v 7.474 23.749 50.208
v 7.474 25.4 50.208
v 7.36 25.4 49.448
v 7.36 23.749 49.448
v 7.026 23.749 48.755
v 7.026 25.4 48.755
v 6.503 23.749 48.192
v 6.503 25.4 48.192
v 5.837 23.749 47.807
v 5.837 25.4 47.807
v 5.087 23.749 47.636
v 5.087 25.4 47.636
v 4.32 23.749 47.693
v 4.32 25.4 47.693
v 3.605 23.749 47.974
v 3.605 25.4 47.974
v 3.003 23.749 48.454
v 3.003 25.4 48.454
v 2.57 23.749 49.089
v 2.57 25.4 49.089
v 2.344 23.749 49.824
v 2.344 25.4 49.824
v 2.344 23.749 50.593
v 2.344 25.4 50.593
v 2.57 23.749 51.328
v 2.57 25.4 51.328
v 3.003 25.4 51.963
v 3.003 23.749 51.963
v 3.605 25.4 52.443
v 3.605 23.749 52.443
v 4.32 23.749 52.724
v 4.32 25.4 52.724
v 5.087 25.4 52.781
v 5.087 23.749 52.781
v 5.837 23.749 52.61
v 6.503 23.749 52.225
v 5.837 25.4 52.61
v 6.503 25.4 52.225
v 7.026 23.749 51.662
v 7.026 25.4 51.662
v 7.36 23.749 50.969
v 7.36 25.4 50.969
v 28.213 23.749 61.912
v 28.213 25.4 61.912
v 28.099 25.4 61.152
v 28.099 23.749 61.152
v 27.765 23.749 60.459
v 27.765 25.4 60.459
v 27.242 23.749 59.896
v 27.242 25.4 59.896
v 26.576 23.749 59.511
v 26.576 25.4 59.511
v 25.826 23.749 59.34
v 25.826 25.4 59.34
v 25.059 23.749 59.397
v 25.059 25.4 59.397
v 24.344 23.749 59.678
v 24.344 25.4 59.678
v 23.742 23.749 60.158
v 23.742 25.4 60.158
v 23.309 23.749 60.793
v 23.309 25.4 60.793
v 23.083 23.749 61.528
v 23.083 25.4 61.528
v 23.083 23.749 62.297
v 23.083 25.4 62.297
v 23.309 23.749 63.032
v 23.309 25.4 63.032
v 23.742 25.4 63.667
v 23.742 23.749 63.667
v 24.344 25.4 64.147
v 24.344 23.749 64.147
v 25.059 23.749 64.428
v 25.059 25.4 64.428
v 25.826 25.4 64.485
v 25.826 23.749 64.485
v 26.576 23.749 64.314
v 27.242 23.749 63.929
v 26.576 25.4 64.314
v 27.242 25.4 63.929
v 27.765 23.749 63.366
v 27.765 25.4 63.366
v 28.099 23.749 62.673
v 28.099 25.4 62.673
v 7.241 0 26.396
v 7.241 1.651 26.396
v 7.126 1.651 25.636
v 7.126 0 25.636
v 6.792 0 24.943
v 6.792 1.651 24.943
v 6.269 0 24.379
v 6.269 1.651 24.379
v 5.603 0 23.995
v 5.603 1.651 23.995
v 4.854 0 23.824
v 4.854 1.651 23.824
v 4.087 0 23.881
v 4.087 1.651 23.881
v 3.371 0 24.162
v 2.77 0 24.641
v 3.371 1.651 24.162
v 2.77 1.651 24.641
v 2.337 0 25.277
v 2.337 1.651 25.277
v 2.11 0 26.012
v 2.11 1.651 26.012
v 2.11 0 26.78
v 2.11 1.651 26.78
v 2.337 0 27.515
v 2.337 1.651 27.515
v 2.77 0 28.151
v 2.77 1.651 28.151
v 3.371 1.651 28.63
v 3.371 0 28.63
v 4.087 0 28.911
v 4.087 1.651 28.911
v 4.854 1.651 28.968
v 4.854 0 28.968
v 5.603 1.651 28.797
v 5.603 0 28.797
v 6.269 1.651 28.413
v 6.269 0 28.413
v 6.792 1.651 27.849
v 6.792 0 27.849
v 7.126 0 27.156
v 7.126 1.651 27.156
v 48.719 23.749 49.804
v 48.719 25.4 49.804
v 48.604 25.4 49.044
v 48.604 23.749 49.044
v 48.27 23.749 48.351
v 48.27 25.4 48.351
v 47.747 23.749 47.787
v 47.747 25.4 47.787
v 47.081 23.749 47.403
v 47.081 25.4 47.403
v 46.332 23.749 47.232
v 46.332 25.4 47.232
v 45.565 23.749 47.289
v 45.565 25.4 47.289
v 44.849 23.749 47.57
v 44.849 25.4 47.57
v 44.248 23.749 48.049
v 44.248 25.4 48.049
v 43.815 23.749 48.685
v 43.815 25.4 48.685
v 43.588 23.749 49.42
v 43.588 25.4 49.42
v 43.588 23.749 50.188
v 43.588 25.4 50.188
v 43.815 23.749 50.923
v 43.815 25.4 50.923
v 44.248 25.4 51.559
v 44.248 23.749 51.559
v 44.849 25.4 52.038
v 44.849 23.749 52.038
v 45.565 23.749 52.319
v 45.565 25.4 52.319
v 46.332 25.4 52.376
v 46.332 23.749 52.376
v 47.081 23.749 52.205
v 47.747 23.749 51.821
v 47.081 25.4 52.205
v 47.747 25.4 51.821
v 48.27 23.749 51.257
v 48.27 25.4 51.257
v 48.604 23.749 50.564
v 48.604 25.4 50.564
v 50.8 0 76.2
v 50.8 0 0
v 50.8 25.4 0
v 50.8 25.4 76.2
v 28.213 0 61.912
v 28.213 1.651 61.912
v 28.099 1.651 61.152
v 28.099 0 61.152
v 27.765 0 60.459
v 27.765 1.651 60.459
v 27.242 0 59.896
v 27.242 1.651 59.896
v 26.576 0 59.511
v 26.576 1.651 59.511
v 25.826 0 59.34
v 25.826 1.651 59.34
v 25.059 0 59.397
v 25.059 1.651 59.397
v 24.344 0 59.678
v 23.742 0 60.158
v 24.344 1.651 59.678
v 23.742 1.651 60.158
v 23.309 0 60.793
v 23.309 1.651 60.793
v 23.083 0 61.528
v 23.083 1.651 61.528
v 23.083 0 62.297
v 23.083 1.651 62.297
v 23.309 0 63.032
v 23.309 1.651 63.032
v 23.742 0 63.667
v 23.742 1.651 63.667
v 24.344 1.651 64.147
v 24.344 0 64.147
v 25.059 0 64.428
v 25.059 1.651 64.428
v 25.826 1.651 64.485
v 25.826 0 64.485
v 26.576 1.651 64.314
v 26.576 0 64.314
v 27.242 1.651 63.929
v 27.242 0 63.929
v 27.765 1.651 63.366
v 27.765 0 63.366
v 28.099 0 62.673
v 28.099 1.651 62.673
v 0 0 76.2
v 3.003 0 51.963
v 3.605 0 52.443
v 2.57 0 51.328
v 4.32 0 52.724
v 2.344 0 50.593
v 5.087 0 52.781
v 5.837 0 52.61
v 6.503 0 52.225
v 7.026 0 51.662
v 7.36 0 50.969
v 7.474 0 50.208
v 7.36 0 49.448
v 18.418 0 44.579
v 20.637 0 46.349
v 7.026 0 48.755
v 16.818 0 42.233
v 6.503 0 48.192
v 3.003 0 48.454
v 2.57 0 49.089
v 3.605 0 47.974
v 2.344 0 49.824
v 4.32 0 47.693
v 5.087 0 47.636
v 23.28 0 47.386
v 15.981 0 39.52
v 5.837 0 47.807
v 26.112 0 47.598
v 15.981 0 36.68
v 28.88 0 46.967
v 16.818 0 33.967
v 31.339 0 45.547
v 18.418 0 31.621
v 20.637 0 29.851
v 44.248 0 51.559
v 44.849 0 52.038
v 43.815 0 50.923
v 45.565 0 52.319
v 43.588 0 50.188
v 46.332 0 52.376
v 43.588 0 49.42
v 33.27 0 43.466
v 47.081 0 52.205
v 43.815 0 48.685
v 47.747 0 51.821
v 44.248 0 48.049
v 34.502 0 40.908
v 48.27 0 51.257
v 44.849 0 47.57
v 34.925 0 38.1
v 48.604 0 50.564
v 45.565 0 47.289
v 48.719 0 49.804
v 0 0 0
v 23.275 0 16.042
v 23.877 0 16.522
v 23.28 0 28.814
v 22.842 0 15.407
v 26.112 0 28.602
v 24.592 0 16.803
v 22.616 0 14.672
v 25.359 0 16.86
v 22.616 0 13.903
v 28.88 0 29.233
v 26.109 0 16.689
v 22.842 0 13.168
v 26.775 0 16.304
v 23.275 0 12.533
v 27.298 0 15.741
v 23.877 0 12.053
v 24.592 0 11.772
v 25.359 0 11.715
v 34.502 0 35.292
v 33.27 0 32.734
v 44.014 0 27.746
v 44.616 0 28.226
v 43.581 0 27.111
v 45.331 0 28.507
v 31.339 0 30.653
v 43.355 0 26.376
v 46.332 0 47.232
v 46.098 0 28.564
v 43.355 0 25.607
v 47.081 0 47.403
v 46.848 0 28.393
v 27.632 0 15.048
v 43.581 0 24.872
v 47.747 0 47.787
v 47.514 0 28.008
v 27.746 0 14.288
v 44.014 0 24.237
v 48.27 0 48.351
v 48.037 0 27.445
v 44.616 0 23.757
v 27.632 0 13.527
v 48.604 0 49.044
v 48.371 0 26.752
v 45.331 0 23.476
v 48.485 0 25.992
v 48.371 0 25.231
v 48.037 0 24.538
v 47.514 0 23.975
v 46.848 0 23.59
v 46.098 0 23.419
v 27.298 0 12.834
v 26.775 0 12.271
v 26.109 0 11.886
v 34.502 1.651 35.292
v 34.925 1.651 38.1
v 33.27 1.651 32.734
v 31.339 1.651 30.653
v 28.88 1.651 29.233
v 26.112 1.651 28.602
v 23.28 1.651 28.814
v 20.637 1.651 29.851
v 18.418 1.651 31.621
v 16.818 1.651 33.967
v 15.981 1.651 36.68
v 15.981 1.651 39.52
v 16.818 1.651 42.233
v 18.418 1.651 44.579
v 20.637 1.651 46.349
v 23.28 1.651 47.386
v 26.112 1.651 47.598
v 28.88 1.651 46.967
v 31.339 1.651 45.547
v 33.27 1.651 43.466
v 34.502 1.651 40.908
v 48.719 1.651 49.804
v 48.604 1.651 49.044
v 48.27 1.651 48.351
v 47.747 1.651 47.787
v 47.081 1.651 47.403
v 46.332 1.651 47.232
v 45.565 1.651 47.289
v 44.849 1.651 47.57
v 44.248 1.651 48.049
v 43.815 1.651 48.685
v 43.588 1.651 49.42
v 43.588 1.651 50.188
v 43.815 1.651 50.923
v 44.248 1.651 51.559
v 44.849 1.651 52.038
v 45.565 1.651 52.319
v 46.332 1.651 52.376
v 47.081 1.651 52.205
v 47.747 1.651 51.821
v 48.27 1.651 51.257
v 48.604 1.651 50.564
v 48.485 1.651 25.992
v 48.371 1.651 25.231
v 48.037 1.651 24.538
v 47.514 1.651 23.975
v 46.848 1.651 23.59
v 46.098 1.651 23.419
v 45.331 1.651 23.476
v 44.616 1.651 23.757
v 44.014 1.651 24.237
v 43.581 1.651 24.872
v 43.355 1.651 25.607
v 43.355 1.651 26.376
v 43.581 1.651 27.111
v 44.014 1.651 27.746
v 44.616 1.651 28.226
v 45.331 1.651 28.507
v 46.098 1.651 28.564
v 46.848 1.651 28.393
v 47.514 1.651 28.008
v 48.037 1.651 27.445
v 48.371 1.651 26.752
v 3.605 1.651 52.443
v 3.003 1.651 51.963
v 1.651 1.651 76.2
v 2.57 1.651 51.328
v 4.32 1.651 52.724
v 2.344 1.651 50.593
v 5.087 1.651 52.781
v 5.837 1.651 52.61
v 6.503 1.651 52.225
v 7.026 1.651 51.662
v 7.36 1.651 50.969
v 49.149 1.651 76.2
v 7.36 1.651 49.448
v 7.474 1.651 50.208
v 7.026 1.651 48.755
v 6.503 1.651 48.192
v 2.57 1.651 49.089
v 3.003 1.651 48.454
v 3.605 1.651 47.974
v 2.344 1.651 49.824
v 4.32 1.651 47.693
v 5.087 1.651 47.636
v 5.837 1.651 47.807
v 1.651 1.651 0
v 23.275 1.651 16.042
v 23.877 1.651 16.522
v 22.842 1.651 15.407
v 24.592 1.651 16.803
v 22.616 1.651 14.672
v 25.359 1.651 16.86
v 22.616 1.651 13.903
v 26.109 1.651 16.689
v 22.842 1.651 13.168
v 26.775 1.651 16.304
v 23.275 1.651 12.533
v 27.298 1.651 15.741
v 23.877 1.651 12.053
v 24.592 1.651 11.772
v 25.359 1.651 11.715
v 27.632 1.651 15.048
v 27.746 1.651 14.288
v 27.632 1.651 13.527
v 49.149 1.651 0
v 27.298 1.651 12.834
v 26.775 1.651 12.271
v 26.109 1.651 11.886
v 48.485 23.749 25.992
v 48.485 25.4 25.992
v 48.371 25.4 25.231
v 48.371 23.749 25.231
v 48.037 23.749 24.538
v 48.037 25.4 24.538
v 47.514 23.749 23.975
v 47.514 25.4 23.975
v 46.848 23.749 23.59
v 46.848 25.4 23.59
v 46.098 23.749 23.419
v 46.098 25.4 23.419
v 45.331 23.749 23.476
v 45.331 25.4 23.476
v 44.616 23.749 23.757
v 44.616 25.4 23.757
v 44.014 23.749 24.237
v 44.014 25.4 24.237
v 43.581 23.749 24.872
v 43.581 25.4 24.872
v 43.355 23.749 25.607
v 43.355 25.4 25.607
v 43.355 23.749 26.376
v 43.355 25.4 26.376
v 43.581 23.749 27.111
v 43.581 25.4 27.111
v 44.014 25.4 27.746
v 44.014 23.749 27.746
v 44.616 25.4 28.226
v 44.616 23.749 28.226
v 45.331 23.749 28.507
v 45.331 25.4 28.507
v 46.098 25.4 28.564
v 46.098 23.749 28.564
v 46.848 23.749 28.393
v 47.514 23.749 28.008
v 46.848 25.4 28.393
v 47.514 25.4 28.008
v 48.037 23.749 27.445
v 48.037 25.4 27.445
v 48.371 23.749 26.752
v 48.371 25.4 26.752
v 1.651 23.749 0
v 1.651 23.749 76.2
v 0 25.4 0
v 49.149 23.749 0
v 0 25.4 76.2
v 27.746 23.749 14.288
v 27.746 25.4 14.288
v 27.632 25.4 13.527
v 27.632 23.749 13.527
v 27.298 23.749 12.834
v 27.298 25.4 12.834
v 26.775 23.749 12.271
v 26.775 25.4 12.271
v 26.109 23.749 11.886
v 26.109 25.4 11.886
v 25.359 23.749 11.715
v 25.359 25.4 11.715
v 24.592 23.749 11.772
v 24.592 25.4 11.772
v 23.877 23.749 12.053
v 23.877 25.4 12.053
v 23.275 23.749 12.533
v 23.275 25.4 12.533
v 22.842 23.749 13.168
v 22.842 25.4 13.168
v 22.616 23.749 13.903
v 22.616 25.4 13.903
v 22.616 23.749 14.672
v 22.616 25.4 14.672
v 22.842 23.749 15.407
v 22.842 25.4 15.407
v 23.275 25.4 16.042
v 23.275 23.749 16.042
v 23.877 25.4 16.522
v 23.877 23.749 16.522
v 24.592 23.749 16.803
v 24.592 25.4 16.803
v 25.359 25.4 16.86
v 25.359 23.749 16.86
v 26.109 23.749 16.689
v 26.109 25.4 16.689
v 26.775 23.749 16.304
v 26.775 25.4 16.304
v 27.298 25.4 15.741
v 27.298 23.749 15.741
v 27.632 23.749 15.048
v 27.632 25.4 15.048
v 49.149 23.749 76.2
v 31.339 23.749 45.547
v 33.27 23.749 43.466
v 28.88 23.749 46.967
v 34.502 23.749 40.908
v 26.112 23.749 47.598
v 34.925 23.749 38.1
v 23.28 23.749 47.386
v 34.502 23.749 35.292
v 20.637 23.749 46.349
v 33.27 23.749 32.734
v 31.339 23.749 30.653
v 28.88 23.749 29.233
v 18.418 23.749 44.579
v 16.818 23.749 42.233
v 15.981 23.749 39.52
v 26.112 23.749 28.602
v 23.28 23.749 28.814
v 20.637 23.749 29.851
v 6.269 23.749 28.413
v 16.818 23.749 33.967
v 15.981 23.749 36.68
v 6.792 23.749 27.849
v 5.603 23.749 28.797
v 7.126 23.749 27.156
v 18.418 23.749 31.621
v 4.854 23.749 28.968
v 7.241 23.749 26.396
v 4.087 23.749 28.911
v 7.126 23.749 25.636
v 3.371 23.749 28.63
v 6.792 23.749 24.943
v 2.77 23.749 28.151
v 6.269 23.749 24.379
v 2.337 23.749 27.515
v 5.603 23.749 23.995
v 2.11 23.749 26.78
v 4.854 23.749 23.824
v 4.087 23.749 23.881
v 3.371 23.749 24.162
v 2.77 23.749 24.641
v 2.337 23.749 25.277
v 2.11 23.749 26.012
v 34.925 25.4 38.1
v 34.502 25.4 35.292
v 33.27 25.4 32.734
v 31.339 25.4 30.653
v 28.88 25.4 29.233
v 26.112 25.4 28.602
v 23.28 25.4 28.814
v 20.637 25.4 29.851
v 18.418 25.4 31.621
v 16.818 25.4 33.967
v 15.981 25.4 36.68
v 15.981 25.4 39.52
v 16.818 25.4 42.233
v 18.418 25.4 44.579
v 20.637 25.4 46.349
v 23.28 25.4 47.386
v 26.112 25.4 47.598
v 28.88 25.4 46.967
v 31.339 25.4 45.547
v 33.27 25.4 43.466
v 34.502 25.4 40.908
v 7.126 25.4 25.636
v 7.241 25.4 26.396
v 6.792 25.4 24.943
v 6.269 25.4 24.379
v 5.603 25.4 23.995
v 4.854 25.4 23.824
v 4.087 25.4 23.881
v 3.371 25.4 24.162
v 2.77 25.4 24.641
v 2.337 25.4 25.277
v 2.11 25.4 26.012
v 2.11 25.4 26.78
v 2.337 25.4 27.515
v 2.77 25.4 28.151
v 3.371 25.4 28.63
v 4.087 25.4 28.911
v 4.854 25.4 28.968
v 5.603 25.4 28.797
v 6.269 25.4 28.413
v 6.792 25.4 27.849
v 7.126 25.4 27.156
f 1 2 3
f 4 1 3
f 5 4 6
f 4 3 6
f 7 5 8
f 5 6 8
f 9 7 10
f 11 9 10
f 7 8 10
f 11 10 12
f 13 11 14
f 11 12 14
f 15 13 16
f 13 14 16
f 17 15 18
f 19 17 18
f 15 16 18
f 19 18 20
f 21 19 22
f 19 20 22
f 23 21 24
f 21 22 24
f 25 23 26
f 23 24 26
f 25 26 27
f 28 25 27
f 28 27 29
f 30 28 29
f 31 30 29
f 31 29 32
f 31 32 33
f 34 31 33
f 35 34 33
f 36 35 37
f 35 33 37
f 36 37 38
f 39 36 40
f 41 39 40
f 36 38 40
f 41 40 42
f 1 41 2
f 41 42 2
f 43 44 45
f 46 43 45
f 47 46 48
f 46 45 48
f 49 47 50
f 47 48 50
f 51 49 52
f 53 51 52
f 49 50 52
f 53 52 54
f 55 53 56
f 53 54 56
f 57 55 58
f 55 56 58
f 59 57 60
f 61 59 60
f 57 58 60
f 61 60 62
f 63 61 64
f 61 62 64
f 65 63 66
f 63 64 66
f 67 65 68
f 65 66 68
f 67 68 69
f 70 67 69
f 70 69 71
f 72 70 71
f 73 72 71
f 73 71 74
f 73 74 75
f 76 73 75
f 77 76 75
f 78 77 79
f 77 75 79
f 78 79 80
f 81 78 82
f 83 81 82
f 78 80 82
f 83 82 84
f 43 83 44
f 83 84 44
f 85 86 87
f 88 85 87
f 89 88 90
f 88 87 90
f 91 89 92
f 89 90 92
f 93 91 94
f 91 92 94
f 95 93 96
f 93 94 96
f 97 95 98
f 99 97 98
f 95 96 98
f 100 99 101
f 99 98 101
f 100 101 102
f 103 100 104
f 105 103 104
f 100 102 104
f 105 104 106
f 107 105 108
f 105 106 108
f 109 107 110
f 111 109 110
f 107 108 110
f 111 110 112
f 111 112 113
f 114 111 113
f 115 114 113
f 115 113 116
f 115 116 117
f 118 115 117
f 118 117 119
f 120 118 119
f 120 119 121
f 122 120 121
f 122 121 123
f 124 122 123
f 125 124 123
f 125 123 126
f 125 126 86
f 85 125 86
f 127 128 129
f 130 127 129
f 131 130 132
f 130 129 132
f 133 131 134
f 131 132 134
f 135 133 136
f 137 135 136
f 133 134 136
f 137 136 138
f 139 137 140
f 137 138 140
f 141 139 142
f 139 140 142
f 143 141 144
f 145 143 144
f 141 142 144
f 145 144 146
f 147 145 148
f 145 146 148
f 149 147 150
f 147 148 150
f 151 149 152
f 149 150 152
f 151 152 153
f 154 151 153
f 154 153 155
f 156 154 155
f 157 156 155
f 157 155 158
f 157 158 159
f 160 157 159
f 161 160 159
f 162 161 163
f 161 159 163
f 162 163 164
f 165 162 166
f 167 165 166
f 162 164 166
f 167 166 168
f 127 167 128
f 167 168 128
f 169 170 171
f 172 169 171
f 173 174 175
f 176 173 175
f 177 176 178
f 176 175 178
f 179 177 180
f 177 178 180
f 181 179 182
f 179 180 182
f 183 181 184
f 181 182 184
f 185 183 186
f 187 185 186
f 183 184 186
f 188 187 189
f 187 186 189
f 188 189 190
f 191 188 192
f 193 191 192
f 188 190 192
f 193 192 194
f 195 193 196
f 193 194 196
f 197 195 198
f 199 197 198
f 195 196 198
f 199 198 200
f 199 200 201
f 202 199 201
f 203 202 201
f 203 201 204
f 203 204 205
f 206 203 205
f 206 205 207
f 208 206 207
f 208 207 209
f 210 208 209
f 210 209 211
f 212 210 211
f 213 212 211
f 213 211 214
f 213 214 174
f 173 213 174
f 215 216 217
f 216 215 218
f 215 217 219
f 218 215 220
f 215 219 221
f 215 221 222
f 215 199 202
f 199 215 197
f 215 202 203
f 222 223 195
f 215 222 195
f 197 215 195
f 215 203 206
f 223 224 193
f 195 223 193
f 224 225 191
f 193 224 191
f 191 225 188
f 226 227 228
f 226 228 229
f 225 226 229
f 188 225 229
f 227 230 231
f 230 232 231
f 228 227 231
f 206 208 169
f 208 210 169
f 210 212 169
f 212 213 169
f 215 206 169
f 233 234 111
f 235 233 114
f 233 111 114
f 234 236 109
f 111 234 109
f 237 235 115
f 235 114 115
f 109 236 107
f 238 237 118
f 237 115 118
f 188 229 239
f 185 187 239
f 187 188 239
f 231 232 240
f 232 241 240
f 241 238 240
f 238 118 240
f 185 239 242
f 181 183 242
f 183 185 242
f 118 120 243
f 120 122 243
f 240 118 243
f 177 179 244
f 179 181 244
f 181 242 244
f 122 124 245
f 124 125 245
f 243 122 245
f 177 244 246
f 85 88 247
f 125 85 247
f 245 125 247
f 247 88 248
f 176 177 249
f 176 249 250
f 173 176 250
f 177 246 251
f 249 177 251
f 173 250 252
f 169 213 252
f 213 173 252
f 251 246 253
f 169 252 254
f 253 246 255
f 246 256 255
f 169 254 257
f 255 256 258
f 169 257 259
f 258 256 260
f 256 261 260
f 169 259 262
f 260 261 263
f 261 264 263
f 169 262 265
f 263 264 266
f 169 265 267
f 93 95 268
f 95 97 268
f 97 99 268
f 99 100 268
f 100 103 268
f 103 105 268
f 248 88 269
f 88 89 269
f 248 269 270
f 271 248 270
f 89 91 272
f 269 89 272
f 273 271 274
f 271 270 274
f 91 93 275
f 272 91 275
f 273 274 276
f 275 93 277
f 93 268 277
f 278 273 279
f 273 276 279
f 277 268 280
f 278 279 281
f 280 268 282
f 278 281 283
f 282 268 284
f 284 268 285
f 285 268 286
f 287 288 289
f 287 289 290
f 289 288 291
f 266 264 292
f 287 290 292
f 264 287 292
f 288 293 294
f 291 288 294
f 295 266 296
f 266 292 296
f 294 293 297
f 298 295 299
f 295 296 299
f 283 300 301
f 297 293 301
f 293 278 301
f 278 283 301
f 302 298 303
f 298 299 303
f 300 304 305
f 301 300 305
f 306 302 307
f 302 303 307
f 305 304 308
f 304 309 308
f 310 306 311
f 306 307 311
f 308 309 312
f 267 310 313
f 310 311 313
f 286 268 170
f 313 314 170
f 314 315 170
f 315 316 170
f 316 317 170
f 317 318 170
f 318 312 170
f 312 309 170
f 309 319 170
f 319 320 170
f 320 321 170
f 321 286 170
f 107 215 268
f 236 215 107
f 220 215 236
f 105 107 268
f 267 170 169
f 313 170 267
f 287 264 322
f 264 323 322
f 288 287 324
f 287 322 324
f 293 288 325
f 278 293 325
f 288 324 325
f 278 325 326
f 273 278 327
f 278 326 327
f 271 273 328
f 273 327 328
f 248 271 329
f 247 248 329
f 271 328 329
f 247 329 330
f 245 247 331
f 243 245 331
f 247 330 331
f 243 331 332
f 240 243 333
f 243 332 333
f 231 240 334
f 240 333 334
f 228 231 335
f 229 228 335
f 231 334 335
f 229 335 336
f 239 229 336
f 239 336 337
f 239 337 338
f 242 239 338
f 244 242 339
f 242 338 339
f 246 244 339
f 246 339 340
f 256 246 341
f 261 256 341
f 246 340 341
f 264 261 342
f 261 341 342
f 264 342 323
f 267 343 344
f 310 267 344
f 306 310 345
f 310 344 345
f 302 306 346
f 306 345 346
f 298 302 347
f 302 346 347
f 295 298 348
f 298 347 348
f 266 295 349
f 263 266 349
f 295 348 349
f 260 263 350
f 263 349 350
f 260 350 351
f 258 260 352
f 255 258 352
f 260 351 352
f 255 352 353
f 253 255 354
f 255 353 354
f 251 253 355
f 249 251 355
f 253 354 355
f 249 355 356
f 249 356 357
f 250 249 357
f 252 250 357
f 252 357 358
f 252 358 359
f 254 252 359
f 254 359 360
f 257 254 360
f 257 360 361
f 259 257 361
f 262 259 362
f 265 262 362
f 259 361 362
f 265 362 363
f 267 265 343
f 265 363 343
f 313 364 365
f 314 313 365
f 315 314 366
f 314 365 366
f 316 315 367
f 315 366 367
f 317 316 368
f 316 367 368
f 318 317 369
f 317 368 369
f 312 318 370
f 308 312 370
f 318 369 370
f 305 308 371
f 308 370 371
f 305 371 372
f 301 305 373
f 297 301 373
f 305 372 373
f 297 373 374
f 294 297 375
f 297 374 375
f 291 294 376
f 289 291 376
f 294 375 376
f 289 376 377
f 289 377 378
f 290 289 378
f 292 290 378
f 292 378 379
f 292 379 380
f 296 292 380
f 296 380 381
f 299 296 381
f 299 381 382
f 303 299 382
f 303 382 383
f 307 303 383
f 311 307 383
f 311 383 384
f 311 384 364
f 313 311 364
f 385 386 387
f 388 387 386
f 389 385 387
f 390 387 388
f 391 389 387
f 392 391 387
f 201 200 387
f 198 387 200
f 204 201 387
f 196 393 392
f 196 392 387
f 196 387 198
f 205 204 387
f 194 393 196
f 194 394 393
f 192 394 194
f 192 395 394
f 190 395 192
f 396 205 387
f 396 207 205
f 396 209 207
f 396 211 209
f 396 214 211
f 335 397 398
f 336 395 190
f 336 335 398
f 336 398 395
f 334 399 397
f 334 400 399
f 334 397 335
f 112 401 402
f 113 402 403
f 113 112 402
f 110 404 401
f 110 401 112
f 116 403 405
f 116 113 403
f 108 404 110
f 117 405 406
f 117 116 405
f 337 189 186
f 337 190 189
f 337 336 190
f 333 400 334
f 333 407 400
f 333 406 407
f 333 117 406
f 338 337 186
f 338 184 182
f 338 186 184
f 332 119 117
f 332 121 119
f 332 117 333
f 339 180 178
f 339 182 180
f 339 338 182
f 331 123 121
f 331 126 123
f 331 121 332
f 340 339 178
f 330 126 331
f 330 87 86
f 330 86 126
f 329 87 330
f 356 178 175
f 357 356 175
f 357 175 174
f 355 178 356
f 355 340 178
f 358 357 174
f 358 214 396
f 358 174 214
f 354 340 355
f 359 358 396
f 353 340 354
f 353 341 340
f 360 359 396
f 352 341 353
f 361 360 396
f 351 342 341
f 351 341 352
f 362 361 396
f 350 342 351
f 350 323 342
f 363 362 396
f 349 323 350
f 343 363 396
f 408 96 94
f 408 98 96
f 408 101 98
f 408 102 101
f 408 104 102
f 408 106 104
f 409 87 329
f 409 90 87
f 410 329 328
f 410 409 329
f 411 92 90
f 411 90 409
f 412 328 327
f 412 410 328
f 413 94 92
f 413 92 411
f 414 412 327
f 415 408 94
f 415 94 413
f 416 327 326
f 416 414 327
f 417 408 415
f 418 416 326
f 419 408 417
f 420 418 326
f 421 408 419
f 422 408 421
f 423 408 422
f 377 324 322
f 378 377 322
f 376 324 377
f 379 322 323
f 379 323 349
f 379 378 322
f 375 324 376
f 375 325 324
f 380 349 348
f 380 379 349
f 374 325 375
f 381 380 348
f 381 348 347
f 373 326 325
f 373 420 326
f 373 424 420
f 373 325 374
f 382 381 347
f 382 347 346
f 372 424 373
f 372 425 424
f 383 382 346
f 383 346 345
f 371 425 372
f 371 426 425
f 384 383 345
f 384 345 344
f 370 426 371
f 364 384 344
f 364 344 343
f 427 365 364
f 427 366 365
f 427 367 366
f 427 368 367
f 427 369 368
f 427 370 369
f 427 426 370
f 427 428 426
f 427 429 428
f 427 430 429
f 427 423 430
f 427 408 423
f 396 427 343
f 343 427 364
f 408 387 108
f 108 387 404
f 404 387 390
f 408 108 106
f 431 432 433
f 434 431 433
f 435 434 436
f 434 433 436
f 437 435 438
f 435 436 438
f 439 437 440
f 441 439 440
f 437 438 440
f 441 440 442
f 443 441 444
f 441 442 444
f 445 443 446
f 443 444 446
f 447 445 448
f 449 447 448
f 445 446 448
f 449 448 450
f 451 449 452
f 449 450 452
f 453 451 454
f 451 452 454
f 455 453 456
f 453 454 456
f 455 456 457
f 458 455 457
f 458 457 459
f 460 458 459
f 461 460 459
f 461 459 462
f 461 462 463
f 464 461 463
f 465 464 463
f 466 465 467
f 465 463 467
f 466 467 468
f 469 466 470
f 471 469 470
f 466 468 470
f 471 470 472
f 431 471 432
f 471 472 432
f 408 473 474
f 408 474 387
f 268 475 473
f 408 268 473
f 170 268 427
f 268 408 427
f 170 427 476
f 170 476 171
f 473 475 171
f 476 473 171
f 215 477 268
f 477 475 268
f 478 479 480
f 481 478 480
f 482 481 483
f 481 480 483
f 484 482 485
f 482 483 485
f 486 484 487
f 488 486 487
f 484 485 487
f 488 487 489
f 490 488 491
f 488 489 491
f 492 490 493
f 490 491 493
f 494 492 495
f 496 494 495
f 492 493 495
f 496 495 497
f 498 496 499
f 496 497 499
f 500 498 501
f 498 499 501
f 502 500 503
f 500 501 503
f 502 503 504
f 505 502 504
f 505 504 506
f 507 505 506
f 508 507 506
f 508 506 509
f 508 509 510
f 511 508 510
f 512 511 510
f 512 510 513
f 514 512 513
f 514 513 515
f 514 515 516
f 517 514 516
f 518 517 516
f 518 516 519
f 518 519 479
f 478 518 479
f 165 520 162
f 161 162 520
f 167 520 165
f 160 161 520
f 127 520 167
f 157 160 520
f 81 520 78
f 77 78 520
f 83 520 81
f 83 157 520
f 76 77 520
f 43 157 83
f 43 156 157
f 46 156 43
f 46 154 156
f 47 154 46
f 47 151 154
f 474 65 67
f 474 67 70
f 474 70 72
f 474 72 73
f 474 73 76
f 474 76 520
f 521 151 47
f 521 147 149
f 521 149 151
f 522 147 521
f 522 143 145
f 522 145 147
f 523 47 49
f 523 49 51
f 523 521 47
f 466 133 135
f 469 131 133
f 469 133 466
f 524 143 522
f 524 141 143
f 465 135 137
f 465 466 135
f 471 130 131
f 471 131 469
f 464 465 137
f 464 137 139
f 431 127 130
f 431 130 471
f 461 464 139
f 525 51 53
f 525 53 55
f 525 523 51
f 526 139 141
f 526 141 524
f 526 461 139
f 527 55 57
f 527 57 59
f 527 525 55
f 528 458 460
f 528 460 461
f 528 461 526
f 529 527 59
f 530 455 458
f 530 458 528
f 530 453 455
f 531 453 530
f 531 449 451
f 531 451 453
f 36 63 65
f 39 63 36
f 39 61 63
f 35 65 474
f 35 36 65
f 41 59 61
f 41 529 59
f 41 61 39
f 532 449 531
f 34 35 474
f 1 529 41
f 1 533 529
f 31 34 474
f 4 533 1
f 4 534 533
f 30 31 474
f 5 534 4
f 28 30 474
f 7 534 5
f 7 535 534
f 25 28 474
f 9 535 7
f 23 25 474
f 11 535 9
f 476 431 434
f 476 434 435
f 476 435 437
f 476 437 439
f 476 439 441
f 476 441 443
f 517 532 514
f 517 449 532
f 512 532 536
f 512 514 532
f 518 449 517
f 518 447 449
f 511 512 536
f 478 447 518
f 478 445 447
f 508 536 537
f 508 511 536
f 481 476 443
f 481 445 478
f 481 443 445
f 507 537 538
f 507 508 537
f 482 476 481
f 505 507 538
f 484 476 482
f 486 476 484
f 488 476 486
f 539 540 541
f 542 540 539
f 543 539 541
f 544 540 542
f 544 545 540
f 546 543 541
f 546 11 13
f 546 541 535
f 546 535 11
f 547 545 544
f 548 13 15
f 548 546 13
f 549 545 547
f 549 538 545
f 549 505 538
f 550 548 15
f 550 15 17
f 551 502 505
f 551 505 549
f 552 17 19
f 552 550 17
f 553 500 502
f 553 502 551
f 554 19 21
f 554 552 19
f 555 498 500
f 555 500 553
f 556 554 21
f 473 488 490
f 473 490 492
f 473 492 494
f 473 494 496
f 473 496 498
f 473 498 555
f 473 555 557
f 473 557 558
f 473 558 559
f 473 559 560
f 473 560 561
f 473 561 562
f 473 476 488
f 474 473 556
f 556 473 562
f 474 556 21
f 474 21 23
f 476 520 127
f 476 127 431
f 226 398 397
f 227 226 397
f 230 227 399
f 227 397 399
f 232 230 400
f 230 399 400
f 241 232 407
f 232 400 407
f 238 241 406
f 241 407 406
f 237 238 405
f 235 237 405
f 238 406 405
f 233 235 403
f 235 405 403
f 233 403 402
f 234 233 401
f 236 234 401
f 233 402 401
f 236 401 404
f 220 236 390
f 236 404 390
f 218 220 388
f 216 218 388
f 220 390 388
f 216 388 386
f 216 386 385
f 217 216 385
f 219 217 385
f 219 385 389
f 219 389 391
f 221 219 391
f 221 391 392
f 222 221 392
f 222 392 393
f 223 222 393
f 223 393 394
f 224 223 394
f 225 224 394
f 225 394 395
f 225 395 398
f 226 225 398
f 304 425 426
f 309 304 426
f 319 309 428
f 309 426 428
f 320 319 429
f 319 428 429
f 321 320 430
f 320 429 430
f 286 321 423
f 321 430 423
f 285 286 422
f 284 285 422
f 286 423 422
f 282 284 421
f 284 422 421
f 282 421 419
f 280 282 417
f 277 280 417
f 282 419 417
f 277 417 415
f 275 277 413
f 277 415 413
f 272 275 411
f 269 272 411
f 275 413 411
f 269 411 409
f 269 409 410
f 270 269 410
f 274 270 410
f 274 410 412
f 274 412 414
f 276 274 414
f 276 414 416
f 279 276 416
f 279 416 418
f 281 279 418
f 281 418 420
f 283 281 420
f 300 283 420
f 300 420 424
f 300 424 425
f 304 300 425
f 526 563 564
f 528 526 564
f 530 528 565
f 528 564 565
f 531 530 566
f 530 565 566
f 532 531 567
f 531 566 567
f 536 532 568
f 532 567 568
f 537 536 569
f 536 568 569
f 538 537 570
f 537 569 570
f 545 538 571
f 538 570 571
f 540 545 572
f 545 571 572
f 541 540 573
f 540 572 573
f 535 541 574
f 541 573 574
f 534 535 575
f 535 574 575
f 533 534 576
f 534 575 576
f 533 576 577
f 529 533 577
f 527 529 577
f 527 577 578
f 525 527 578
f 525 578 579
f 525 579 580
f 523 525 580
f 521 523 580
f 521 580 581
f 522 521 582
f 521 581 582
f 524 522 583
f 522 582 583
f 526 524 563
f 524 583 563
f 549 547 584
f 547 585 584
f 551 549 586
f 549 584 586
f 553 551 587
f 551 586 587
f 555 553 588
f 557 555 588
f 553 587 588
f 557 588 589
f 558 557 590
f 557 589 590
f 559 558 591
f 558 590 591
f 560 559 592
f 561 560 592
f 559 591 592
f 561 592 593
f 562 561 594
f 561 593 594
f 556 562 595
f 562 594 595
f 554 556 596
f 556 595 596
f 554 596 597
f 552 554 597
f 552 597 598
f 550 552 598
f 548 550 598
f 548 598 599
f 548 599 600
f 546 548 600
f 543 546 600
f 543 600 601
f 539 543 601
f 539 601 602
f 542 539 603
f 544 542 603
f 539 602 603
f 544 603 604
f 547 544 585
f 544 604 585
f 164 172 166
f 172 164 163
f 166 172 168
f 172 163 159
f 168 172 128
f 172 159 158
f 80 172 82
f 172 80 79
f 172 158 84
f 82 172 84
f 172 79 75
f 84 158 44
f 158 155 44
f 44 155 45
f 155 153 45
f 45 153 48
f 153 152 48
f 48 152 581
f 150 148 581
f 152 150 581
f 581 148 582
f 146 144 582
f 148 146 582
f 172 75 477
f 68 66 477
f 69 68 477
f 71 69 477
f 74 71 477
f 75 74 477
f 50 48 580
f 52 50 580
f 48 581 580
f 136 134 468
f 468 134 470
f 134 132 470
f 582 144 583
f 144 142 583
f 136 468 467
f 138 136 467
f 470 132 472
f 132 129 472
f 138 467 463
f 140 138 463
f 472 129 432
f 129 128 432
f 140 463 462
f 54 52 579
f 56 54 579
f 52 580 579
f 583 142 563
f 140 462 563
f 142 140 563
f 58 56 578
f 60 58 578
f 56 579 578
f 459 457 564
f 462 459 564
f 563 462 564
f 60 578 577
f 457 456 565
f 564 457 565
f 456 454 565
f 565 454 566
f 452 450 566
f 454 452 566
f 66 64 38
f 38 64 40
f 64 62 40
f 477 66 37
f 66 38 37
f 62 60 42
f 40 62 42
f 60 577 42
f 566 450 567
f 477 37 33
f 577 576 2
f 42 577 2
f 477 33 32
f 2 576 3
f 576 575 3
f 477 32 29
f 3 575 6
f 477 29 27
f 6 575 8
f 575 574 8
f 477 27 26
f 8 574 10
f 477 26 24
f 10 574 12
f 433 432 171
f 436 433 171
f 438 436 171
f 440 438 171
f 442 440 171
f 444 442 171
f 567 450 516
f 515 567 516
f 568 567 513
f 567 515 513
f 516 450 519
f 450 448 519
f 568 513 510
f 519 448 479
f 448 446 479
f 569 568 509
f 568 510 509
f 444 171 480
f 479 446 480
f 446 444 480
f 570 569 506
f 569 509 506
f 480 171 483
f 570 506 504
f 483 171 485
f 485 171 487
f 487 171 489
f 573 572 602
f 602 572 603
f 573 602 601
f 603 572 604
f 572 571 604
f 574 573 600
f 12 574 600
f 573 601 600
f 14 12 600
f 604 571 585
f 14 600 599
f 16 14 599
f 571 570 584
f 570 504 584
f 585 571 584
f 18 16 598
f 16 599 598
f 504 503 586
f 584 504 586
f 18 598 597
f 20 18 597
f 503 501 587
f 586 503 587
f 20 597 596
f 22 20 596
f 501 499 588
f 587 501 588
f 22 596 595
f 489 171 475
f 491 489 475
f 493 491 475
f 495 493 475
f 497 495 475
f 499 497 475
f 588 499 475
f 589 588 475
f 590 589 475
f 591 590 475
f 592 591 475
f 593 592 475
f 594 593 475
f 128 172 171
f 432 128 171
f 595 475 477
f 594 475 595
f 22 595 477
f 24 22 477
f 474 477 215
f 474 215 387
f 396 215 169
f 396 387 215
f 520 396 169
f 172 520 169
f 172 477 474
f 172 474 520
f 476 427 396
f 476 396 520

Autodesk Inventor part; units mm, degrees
ref_plane "YZ Plane" through (0, 0, 0) normal (1, 0, 0) x (0, 1, 0)
ref_plane "XZ Plane" through (0, 0, 0) normal (0, 1, 0) x (-1, 0, 0)
ref_plane "XY Plane" through (0, 0, 0) normal (0, 0, 1) x (1, 0, 0)
sketch "Sketch1" plane through (0, 0, 0) normal (0, 0, 1) x (1, 0, 0)
  line L0 (0, 0) -> (50.8, 0)
  line L1 (50.8, 0) -> (50.8, 25.4)
  line L2 (50.8, 25.4) -> (0, 25.4)
  line L3 (0, 25.4) -> (0, 0)
  line L4 (49.149, 23.749) -> (1.651, 23.749)
  line L5 (1.651, 23.749) -> (1.651, 1.651)
  line L6 (1.651, 1.651) -> (49.149, 1.651)
  line L7 (49.149, 1.651) -> (49.149, 23.749)
  line L8 (49.149, 23.749) -> (1.651, 1.651) construction
  line L9 (1.651, 23.749) -> (49.149, 1.651) construction
  point P0 (25.4, 12.7)
  dimension "d0" = 1.651
  dimension "d1" = 25.4
  dimension "d2" = 50.8
  dimension "d3" = 1.651
  dimension "d4" = 1.651
  dimension "d5" = 1.651
extrude "Extrusion1" add sketch "Sketch1" along normal blind 76.2
sketch "Sketch2" plane through (0, 25.4, 0) normal (0, 1, 0) x (1, 0, 0)
  circle A0 centre (25.4, -38.1) radius 9.525
  line L0 (50.8, 0) -> (50.8, -76.2) projected
  line L1 (50.8, -76.2) -> (0, -76.2) projected
  point P0 (0, 0)
  dimension "d8" = 19.05
  dimension "d9" = 25.4
  dimension "d10" = 38.1
extrude "Extrusion2" cut sketch "Sketch2" against normal blind 76.2
sketch "Sketch4" plane through (0, 25.4, 0) normal (0, 1, 0) x (1, 0, 0)
  circle A0 centre (25.1665, -14.2875) radius 2.5797
  circle A1 centre (25.4, -38.1) radius 9.525 projected
  circle A2 centre (25.4, -38.1) radius 23.8136 construction
  circle A3 centre (4.661, -26.396) radius 2.5797
  circle A4 centre (4.8945, -50.2085) radius 2.5797
  circle A5 centre (25.6335, -61.9125) radius 2.5797
  circle A6 centre (46.139, -49.804) radius 2.5797
  circle A7 centre (45.9055, -25.9915) radius 2.5797
  point P0 (0, 0)
  dimension "d31" = 23.8125
  dimension "d32" = 5.1594
  dimension "d35" = 360
extrude "Extrusion4" cut sketch "Sketch4" against normal blind 76.2 contours A0 | A3 | A4 | A5 | A6 | A7
equation "\"d3\" = d0"
equation "\"d4\" = d0"
equation "\"d5\" = d0"
properties part number "hub attachment"
